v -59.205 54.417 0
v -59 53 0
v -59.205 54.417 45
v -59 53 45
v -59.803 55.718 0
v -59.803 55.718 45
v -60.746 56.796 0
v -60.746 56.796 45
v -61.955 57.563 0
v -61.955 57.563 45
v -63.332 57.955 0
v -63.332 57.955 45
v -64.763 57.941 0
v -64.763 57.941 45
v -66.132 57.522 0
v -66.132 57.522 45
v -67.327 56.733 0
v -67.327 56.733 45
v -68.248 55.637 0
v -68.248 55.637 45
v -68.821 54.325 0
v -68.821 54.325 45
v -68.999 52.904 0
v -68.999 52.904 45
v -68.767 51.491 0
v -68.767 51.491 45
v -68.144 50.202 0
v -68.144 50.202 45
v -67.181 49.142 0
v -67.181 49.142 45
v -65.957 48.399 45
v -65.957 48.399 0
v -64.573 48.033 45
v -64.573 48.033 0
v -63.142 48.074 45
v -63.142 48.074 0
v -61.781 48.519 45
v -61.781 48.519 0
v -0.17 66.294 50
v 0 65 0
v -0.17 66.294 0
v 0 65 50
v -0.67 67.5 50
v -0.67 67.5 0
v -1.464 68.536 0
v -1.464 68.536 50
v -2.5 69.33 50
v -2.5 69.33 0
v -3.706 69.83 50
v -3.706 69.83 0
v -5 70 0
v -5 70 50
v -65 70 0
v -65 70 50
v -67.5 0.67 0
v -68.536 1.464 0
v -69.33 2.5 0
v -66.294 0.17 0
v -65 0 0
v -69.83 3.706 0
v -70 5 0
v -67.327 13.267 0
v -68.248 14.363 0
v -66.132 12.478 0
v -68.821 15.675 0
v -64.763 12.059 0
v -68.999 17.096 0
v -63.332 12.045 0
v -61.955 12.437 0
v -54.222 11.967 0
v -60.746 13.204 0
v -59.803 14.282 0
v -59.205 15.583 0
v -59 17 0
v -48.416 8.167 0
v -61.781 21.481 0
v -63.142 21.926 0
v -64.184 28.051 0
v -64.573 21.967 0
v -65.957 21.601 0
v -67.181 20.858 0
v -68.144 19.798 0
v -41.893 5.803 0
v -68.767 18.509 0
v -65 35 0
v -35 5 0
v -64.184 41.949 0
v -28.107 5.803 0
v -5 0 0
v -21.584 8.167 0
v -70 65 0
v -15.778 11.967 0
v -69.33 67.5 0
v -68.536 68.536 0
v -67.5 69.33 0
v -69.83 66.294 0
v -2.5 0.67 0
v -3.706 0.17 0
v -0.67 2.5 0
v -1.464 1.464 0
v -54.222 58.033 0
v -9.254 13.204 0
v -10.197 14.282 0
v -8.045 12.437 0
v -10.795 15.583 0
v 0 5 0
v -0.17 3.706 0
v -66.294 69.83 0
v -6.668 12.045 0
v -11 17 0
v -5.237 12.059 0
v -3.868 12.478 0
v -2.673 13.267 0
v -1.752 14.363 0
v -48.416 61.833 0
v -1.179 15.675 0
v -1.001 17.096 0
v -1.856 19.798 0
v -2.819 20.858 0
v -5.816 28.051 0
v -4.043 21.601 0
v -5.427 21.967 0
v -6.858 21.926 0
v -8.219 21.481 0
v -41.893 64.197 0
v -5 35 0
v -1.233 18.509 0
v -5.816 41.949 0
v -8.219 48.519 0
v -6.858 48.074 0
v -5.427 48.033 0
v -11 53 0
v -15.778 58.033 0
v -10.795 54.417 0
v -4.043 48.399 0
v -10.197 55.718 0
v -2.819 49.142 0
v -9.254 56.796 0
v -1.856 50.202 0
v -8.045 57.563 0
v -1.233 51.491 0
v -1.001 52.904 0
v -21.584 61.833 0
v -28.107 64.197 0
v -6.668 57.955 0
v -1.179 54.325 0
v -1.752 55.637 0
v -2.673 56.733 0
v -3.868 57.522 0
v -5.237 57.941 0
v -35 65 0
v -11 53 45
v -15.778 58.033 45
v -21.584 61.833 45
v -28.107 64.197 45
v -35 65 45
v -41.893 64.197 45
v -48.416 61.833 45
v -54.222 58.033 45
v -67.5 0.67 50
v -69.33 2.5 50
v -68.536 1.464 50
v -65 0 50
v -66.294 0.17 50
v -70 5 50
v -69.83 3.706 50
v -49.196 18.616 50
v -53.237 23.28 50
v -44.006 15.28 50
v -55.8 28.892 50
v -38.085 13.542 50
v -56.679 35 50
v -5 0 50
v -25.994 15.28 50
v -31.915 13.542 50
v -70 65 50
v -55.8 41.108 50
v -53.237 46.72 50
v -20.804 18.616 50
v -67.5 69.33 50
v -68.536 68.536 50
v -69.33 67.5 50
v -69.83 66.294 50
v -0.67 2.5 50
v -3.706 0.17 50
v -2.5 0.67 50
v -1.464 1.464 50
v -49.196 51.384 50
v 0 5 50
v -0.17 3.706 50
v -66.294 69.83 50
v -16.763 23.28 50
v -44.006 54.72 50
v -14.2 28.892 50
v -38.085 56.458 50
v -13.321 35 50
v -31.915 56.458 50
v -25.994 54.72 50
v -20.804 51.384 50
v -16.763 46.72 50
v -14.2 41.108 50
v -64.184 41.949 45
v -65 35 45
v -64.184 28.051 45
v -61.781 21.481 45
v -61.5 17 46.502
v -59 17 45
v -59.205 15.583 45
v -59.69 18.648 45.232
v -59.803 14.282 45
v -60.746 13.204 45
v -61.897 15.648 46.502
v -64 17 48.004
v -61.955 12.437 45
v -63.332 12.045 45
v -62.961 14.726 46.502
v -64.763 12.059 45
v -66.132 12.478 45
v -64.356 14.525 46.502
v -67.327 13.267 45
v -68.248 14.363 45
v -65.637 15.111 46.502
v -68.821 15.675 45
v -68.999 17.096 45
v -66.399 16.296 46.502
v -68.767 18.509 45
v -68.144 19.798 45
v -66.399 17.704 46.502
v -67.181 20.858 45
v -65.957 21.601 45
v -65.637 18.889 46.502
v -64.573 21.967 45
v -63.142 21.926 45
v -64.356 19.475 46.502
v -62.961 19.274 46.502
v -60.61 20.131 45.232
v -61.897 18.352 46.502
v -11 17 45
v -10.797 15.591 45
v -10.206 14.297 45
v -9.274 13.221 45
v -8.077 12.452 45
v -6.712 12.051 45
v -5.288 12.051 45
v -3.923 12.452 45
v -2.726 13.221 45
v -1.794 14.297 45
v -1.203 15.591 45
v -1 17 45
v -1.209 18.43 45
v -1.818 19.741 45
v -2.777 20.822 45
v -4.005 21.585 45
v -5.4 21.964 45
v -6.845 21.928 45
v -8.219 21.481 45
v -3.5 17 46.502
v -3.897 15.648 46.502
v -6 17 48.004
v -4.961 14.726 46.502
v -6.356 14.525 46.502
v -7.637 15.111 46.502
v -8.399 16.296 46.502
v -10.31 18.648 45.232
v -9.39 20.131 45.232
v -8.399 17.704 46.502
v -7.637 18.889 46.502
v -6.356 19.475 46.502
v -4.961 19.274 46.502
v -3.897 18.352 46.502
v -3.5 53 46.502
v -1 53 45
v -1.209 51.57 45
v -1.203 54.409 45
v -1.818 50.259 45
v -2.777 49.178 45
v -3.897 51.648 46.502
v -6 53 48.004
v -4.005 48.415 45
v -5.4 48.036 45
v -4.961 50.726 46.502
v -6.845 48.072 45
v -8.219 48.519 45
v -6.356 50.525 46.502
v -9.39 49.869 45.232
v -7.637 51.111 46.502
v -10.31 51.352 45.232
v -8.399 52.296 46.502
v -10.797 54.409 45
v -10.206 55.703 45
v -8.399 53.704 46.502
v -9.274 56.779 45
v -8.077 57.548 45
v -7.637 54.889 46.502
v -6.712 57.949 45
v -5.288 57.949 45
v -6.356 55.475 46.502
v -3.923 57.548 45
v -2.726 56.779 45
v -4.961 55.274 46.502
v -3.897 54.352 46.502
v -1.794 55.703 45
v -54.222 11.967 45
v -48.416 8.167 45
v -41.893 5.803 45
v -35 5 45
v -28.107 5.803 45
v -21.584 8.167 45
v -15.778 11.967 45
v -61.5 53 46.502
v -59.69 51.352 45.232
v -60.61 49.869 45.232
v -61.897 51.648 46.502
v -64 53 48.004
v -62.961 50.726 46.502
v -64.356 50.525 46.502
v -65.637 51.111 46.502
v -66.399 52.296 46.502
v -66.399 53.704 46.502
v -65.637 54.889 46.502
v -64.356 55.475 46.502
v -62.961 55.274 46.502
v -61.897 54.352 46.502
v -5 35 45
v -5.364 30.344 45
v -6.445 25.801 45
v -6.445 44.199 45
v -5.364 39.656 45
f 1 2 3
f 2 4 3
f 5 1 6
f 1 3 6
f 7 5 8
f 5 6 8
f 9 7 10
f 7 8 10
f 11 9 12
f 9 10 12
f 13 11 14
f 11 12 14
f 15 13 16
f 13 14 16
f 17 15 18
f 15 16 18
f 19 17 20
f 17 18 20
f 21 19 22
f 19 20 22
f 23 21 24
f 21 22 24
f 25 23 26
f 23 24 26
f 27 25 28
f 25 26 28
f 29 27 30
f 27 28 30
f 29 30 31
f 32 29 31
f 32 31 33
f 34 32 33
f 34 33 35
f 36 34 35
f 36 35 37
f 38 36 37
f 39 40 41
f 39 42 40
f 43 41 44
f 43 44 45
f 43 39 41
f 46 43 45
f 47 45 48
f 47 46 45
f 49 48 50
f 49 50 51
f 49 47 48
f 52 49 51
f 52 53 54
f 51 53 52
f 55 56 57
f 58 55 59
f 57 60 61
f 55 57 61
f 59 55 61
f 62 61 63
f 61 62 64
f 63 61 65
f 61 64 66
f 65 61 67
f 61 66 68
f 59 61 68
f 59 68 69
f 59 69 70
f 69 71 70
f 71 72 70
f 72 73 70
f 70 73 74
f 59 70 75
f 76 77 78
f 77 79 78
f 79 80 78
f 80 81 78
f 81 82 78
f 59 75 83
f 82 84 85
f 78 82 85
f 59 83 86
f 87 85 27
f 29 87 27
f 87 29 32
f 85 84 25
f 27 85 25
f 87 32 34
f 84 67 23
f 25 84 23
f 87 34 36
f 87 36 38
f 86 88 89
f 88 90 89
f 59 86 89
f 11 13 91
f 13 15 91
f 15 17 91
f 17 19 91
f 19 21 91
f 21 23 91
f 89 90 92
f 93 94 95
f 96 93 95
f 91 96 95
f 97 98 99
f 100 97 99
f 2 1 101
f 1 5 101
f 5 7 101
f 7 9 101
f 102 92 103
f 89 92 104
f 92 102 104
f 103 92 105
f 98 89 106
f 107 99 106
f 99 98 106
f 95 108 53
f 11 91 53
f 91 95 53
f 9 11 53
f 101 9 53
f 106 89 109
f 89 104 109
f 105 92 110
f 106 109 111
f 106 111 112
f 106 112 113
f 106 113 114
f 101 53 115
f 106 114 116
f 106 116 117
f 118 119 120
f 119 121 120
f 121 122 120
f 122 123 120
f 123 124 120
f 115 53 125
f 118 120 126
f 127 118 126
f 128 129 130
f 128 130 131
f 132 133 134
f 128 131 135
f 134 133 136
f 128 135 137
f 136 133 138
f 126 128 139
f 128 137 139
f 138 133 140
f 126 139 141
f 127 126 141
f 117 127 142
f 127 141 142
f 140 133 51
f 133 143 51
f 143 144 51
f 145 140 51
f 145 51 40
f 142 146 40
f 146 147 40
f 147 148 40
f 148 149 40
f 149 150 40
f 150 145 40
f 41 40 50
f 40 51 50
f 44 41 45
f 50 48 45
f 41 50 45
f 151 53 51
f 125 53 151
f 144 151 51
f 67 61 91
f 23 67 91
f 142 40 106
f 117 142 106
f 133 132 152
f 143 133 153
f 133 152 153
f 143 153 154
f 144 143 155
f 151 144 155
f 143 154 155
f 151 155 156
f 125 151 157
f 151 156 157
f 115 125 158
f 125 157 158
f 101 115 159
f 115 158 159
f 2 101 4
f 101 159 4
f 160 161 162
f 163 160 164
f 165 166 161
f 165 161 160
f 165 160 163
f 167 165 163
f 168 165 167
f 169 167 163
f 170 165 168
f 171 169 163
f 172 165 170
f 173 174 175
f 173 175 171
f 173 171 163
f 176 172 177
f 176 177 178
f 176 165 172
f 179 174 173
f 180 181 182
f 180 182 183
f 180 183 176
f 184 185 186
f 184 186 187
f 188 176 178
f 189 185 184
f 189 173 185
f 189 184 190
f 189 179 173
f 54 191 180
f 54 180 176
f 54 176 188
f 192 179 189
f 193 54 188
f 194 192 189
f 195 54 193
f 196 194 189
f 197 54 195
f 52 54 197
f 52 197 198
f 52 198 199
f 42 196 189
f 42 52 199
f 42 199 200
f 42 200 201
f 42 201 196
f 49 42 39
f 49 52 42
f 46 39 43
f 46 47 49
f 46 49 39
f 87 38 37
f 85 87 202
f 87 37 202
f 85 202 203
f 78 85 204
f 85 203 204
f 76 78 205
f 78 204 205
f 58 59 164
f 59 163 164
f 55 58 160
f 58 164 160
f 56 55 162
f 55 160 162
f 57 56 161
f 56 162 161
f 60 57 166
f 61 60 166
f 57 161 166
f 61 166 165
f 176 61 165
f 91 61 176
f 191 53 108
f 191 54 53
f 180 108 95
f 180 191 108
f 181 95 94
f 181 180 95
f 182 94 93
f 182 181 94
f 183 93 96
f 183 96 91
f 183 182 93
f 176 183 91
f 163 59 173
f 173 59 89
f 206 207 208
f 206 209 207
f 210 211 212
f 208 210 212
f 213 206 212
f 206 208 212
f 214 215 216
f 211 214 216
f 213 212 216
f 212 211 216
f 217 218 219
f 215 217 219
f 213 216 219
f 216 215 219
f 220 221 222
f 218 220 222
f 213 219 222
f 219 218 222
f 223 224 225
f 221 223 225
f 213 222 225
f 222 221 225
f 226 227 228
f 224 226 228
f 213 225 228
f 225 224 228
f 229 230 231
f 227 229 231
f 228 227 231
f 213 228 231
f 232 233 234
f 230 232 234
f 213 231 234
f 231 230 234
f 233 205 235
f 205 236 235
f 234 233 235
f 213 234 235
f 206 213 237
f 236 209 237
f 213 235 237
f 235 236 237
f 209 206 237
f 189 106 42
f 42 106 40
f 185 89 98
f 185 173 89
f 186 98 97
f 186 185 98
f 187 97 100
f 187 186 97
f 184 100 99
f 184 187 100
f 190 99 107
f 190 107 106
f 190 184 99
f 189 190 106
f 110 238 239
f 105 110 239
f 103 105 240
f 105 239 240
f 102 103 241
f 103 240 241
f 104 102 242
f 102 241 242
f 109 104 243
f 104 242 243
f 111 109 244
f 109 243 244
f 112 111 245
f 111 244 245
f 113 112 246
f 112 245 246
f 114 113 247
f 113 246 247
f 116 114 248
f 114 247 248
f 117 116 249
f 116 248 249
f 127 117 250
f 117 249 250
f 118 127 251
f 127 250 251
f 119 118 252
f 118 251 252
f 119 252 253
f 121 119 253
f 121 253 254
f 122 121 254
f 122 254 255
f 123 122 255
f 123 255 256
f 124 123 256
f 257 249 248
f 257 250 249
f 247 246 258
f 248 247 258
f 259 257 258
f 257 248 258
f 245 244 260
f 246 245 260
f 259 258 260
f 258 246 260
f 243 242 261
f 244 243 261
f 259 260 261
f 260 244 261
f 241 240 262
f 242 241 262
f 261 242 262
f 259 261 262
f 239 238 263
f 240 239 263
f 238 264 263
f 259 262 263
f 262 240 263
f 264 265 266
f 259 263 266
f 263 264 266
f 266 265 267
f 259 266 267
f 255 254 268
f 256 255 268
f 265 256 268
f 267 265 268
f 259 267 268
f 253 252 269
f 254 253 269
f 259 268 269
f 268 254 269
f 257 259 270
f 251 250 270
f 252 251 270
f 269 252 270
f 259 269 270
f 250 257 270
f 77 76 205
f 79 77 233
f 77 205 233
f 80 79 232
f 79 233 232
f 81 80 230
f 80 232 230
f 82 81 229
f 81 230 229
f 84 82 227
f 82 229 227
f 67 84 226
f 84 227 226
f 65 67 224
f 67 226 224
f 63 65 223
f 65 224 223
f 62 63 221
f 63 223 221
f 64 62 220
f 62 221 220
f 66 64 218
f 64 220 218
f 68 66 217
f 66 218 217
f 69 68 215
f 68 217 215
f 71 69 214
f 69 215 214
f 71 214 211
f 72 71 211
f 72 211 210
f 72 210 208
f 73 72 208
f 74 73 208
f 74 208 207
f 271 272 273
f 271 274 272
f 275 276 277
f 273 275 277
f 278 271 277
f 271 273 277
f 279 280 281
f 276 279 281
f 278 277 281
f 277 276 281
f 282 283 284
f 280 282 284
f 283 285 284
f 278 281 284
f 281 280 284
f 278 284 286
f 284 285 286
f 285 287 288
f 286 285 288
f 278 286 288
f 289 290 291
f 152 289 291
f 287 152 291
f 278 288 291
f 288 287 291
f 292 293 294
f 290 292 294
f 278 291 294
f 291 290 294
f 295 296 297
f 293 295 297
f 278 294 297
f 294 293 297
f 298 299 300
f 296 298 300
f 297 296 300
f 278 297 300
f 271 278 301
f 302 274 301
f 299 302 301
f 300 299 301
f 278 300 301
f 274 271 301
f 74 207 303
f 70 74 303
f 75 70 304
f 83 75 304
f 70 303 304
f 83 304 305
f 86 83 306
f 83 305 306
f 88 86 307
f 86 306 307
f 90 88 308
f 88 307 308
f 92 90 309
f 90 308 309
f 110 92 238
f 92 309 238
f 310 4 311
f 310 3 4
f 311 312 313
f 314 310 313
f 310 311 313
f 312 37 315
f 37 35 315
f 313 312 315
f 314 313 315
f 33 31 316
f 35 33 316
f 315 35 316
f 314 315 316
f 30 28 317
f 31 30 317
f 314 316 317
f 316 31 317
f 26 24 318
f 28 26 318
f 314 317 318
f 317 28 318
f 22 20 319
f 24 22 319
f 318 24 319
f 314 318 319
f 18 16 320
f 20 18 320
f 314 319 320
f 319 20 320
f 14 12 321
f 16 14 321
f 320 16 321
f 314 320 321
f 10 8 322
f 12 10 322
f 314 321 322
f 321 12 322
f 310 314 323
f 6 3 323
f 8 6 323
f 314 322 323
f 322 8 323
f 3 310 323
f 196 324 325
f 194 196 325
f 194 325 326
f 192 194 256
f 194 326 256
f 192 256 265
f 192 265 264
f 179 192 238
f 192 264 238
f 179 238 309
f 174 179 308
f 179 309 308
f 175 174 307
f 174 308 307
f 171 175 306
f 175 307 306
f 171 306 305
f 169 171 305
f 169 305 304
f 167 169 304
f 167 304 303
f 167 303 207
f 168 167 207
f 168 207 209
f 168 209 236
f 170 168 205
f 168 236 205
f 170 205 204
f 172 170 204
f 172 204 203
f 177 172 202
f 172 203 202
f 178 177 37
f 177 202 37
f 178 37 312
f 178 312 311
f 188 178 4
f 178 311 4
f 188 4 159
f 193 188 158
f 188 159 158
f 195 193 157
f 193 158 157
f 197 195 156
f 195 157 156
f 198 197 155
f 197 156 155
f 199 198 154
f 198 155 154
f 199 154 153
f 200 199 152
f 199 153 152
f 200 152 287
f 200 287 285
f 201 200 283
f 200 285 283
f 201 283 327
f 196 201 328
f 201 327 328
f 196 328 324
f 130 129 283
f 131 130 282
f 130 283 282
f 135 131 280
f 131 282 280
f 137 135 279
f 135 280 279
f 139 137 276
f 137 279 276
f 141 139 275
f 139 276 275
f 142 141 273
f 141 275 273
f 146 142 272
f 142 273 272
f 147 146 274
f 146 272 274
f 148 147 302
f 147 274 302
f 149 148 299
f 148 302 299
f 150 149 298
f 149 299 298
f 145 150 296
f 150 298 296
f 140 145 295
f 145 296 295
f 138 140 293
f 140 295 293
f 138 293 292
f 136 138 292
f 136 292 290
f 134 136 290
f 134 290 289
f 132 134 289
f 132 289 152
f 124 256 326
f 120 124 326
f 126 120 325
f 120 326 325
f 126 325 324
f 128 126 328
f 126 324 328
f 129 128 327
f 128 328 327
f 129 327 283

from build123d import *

# Parameters (mm, degrees)
F0_W      = 70
F0_H      = 70
F0_R      = 20
F3_DEPTH  = 50
F4_D      = 10
F4_DEPTH  = 45
F4_TIP    = 3.0043030951
F5_D      = 10
F5_DEPTH  = 45
F5_TIP    = 3.0043030951
F7_R      = 5
F8_R      = 5
F9_R      = 5
F10_R     = 5
F11_D     = 60
F11_DEPTH = 45
F11_TIP   = 18.0258185708


with BuildPart() as f3:
    # F0 (on Top) → F3 (new body)
    with BuildSketch(Plane.XY):
        with Locations((-35, 35)):
            Rectangle(F0_W, F0_H)
        with Locations((-35, 35)):
            Circle(F0_R, mode=Mode.SUBTRACT)
    extrude(amount=F3_DEPTH)

    # F4
    with Locations(Plane(origin=(0, 0, 0), x_dir=(1, 0, 0), z_dir=(0, 0, -1))):
        with Locations((-64, -17)):
            Hole(F4_D / 2, depth=F4_DEPTH)
            with Locations((0, 0, -(F4_DEPTH + F4_TIP / 2))):  # 118° drill point
                Cone(0, F4_D / 2, F4_TIP, mode=Mode.SUBTRACT)

    # F5
    with Locations(Plane(origin=(0, 0, 0), x_dir=(1, 0, 0), z_dir=(0, 0, -1))):
        with Locations((-6, -53), (-6, -17), (-64, -53)):
            Hole(F5_D / 2, depth=F5_DEPTH)
            with Locations((0, 0, -(F5_DEPTH + F5_TIP / 2))):  # 118° drill point
                Cone(0, F5_D / 2, F5_TIP, mode=Mode.SUBTRACT)

    # F7
    f7_edges = [f3.edges().sort_by_distance(p)[0] for p in [
        (0, 0, 25),
    ]]
    fillet(f7_edges, radius=F7_R)

    # F8
    f8_edges = [f3.edges().sort_by_distance(p)[0] for p in [
        (-70, 0, 25),
    ]]
    fillet(f8_edges, radius=F8_R)

    # F9
    f9_edges = [f3.edges().sort_by_distance(p)[0] for p in [
        (0, 70, 25),
    ]]
    fillet(f9_edges, radius=F9_R)

    # F10
    f10_edges = [f3.edges().sort_by_distance(p)[0] for p in [
        (-70, 70, 25),
    ]]
    fillet(f10_edges, radius=F10_R)

    # F11
    with Locations(Plane(origin=(0, 0, 0), x_dir=(1, 0, 0), z_dir=(0, 0, -1))):
        with Locations((-35, -35)):
            Hole(F11_D / 2, depth=F11_DEPTH)
            with Locations((0, 0, -(F11_DEPTH + F11_TIP / 2))):  # 118° drill point
                Cone(0, F11_D / 2, F11_TIP, mode=Mode.SUBTRACT)


solid = f3.part
